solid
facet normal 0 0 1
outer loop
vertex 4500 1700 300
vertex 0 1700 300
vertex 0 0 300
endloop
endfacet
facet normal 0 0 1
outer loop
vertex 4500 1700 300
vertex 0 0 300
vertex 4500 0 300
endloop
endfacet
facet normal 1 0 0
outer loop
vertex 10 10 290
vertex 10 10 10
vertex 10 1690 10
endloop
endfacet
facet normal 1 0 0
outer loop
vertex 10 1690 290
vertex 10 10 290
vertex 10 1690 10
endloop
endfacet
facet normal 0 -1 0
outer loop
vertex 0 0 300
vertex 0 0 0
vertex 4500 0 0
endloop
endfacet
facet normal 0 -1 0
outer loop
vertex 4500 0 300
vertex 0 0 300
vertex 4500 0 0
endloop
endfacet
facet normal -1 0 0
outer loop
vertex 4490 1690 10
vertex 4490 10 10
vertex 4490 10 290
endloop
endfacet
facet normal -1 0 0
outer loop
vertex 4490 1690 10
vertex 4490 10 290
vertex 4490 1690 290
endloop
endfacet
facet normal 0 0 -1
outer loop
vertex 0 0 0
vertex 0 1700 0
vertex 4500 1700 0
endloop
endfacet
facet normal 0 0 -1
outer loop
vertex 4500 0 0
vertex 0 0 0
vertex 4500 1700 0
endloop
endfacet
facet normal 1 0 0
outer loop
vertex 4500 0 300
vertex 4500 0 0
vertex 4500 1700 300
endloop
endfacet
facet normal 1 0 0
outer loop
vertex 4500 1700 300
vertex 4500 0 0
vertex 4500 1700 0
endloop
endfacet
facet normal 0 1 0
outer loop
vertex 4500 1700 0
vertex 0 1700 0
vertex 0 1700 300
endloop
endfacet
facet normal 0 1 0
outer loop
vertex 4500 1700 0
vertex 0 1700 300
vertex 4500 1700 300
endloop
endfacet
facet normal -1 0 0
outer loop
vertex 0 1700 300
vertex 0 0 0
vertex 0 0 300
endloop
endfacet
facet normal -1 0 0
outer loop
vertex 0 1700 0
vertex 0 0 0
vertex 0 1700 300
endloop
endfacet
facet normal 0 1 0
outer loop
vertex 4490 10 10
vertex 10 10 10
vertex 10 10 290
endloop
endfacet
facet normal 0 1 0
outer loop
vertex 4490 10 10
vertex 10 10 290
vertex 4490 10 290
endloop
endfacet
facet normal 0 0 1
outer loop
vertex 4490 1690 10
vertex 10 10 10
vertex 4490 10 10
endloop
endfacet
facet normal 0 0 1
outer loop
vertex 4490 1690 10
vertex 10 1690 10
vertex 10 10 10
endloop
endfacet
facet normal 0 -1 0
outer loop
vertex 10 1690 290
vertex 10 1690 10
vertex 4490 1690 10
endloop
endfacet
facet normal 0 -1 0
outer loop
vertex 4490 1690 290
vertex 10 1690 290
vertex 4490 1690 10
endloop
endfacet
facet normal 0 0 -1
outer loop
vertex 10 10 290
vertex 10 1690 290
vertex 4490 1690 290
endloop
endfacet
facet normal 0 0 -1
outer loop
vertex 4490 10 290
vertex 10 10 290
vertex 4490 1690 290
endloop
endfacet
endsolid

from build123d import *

# Parameters (mm, degrees)
SKETCH2_W           = 4500
SKETCH2_H           = 1700
BOSS_EXTRUDE1_DEPTH = 300
SHELL1_T            = 10


with BuildPart() as part:
    # Sketch2 → Boss-Extrude1 (new body)
    with BuildSketch(Plane.XY):
        with Locations((2250, 850)):
            Rectangle(SKETCH2_W, SKETCH2_H)
    extrude(amount=BOSS_EXTRUDE1_DEPTH)

    # Shell1 (no face opened: a closed hollow body)
    add(offset(amount=-SHELL1_T, mode=Mode.PRIVATE), mode=Mode.SUBTRACT)


solid = part.part
